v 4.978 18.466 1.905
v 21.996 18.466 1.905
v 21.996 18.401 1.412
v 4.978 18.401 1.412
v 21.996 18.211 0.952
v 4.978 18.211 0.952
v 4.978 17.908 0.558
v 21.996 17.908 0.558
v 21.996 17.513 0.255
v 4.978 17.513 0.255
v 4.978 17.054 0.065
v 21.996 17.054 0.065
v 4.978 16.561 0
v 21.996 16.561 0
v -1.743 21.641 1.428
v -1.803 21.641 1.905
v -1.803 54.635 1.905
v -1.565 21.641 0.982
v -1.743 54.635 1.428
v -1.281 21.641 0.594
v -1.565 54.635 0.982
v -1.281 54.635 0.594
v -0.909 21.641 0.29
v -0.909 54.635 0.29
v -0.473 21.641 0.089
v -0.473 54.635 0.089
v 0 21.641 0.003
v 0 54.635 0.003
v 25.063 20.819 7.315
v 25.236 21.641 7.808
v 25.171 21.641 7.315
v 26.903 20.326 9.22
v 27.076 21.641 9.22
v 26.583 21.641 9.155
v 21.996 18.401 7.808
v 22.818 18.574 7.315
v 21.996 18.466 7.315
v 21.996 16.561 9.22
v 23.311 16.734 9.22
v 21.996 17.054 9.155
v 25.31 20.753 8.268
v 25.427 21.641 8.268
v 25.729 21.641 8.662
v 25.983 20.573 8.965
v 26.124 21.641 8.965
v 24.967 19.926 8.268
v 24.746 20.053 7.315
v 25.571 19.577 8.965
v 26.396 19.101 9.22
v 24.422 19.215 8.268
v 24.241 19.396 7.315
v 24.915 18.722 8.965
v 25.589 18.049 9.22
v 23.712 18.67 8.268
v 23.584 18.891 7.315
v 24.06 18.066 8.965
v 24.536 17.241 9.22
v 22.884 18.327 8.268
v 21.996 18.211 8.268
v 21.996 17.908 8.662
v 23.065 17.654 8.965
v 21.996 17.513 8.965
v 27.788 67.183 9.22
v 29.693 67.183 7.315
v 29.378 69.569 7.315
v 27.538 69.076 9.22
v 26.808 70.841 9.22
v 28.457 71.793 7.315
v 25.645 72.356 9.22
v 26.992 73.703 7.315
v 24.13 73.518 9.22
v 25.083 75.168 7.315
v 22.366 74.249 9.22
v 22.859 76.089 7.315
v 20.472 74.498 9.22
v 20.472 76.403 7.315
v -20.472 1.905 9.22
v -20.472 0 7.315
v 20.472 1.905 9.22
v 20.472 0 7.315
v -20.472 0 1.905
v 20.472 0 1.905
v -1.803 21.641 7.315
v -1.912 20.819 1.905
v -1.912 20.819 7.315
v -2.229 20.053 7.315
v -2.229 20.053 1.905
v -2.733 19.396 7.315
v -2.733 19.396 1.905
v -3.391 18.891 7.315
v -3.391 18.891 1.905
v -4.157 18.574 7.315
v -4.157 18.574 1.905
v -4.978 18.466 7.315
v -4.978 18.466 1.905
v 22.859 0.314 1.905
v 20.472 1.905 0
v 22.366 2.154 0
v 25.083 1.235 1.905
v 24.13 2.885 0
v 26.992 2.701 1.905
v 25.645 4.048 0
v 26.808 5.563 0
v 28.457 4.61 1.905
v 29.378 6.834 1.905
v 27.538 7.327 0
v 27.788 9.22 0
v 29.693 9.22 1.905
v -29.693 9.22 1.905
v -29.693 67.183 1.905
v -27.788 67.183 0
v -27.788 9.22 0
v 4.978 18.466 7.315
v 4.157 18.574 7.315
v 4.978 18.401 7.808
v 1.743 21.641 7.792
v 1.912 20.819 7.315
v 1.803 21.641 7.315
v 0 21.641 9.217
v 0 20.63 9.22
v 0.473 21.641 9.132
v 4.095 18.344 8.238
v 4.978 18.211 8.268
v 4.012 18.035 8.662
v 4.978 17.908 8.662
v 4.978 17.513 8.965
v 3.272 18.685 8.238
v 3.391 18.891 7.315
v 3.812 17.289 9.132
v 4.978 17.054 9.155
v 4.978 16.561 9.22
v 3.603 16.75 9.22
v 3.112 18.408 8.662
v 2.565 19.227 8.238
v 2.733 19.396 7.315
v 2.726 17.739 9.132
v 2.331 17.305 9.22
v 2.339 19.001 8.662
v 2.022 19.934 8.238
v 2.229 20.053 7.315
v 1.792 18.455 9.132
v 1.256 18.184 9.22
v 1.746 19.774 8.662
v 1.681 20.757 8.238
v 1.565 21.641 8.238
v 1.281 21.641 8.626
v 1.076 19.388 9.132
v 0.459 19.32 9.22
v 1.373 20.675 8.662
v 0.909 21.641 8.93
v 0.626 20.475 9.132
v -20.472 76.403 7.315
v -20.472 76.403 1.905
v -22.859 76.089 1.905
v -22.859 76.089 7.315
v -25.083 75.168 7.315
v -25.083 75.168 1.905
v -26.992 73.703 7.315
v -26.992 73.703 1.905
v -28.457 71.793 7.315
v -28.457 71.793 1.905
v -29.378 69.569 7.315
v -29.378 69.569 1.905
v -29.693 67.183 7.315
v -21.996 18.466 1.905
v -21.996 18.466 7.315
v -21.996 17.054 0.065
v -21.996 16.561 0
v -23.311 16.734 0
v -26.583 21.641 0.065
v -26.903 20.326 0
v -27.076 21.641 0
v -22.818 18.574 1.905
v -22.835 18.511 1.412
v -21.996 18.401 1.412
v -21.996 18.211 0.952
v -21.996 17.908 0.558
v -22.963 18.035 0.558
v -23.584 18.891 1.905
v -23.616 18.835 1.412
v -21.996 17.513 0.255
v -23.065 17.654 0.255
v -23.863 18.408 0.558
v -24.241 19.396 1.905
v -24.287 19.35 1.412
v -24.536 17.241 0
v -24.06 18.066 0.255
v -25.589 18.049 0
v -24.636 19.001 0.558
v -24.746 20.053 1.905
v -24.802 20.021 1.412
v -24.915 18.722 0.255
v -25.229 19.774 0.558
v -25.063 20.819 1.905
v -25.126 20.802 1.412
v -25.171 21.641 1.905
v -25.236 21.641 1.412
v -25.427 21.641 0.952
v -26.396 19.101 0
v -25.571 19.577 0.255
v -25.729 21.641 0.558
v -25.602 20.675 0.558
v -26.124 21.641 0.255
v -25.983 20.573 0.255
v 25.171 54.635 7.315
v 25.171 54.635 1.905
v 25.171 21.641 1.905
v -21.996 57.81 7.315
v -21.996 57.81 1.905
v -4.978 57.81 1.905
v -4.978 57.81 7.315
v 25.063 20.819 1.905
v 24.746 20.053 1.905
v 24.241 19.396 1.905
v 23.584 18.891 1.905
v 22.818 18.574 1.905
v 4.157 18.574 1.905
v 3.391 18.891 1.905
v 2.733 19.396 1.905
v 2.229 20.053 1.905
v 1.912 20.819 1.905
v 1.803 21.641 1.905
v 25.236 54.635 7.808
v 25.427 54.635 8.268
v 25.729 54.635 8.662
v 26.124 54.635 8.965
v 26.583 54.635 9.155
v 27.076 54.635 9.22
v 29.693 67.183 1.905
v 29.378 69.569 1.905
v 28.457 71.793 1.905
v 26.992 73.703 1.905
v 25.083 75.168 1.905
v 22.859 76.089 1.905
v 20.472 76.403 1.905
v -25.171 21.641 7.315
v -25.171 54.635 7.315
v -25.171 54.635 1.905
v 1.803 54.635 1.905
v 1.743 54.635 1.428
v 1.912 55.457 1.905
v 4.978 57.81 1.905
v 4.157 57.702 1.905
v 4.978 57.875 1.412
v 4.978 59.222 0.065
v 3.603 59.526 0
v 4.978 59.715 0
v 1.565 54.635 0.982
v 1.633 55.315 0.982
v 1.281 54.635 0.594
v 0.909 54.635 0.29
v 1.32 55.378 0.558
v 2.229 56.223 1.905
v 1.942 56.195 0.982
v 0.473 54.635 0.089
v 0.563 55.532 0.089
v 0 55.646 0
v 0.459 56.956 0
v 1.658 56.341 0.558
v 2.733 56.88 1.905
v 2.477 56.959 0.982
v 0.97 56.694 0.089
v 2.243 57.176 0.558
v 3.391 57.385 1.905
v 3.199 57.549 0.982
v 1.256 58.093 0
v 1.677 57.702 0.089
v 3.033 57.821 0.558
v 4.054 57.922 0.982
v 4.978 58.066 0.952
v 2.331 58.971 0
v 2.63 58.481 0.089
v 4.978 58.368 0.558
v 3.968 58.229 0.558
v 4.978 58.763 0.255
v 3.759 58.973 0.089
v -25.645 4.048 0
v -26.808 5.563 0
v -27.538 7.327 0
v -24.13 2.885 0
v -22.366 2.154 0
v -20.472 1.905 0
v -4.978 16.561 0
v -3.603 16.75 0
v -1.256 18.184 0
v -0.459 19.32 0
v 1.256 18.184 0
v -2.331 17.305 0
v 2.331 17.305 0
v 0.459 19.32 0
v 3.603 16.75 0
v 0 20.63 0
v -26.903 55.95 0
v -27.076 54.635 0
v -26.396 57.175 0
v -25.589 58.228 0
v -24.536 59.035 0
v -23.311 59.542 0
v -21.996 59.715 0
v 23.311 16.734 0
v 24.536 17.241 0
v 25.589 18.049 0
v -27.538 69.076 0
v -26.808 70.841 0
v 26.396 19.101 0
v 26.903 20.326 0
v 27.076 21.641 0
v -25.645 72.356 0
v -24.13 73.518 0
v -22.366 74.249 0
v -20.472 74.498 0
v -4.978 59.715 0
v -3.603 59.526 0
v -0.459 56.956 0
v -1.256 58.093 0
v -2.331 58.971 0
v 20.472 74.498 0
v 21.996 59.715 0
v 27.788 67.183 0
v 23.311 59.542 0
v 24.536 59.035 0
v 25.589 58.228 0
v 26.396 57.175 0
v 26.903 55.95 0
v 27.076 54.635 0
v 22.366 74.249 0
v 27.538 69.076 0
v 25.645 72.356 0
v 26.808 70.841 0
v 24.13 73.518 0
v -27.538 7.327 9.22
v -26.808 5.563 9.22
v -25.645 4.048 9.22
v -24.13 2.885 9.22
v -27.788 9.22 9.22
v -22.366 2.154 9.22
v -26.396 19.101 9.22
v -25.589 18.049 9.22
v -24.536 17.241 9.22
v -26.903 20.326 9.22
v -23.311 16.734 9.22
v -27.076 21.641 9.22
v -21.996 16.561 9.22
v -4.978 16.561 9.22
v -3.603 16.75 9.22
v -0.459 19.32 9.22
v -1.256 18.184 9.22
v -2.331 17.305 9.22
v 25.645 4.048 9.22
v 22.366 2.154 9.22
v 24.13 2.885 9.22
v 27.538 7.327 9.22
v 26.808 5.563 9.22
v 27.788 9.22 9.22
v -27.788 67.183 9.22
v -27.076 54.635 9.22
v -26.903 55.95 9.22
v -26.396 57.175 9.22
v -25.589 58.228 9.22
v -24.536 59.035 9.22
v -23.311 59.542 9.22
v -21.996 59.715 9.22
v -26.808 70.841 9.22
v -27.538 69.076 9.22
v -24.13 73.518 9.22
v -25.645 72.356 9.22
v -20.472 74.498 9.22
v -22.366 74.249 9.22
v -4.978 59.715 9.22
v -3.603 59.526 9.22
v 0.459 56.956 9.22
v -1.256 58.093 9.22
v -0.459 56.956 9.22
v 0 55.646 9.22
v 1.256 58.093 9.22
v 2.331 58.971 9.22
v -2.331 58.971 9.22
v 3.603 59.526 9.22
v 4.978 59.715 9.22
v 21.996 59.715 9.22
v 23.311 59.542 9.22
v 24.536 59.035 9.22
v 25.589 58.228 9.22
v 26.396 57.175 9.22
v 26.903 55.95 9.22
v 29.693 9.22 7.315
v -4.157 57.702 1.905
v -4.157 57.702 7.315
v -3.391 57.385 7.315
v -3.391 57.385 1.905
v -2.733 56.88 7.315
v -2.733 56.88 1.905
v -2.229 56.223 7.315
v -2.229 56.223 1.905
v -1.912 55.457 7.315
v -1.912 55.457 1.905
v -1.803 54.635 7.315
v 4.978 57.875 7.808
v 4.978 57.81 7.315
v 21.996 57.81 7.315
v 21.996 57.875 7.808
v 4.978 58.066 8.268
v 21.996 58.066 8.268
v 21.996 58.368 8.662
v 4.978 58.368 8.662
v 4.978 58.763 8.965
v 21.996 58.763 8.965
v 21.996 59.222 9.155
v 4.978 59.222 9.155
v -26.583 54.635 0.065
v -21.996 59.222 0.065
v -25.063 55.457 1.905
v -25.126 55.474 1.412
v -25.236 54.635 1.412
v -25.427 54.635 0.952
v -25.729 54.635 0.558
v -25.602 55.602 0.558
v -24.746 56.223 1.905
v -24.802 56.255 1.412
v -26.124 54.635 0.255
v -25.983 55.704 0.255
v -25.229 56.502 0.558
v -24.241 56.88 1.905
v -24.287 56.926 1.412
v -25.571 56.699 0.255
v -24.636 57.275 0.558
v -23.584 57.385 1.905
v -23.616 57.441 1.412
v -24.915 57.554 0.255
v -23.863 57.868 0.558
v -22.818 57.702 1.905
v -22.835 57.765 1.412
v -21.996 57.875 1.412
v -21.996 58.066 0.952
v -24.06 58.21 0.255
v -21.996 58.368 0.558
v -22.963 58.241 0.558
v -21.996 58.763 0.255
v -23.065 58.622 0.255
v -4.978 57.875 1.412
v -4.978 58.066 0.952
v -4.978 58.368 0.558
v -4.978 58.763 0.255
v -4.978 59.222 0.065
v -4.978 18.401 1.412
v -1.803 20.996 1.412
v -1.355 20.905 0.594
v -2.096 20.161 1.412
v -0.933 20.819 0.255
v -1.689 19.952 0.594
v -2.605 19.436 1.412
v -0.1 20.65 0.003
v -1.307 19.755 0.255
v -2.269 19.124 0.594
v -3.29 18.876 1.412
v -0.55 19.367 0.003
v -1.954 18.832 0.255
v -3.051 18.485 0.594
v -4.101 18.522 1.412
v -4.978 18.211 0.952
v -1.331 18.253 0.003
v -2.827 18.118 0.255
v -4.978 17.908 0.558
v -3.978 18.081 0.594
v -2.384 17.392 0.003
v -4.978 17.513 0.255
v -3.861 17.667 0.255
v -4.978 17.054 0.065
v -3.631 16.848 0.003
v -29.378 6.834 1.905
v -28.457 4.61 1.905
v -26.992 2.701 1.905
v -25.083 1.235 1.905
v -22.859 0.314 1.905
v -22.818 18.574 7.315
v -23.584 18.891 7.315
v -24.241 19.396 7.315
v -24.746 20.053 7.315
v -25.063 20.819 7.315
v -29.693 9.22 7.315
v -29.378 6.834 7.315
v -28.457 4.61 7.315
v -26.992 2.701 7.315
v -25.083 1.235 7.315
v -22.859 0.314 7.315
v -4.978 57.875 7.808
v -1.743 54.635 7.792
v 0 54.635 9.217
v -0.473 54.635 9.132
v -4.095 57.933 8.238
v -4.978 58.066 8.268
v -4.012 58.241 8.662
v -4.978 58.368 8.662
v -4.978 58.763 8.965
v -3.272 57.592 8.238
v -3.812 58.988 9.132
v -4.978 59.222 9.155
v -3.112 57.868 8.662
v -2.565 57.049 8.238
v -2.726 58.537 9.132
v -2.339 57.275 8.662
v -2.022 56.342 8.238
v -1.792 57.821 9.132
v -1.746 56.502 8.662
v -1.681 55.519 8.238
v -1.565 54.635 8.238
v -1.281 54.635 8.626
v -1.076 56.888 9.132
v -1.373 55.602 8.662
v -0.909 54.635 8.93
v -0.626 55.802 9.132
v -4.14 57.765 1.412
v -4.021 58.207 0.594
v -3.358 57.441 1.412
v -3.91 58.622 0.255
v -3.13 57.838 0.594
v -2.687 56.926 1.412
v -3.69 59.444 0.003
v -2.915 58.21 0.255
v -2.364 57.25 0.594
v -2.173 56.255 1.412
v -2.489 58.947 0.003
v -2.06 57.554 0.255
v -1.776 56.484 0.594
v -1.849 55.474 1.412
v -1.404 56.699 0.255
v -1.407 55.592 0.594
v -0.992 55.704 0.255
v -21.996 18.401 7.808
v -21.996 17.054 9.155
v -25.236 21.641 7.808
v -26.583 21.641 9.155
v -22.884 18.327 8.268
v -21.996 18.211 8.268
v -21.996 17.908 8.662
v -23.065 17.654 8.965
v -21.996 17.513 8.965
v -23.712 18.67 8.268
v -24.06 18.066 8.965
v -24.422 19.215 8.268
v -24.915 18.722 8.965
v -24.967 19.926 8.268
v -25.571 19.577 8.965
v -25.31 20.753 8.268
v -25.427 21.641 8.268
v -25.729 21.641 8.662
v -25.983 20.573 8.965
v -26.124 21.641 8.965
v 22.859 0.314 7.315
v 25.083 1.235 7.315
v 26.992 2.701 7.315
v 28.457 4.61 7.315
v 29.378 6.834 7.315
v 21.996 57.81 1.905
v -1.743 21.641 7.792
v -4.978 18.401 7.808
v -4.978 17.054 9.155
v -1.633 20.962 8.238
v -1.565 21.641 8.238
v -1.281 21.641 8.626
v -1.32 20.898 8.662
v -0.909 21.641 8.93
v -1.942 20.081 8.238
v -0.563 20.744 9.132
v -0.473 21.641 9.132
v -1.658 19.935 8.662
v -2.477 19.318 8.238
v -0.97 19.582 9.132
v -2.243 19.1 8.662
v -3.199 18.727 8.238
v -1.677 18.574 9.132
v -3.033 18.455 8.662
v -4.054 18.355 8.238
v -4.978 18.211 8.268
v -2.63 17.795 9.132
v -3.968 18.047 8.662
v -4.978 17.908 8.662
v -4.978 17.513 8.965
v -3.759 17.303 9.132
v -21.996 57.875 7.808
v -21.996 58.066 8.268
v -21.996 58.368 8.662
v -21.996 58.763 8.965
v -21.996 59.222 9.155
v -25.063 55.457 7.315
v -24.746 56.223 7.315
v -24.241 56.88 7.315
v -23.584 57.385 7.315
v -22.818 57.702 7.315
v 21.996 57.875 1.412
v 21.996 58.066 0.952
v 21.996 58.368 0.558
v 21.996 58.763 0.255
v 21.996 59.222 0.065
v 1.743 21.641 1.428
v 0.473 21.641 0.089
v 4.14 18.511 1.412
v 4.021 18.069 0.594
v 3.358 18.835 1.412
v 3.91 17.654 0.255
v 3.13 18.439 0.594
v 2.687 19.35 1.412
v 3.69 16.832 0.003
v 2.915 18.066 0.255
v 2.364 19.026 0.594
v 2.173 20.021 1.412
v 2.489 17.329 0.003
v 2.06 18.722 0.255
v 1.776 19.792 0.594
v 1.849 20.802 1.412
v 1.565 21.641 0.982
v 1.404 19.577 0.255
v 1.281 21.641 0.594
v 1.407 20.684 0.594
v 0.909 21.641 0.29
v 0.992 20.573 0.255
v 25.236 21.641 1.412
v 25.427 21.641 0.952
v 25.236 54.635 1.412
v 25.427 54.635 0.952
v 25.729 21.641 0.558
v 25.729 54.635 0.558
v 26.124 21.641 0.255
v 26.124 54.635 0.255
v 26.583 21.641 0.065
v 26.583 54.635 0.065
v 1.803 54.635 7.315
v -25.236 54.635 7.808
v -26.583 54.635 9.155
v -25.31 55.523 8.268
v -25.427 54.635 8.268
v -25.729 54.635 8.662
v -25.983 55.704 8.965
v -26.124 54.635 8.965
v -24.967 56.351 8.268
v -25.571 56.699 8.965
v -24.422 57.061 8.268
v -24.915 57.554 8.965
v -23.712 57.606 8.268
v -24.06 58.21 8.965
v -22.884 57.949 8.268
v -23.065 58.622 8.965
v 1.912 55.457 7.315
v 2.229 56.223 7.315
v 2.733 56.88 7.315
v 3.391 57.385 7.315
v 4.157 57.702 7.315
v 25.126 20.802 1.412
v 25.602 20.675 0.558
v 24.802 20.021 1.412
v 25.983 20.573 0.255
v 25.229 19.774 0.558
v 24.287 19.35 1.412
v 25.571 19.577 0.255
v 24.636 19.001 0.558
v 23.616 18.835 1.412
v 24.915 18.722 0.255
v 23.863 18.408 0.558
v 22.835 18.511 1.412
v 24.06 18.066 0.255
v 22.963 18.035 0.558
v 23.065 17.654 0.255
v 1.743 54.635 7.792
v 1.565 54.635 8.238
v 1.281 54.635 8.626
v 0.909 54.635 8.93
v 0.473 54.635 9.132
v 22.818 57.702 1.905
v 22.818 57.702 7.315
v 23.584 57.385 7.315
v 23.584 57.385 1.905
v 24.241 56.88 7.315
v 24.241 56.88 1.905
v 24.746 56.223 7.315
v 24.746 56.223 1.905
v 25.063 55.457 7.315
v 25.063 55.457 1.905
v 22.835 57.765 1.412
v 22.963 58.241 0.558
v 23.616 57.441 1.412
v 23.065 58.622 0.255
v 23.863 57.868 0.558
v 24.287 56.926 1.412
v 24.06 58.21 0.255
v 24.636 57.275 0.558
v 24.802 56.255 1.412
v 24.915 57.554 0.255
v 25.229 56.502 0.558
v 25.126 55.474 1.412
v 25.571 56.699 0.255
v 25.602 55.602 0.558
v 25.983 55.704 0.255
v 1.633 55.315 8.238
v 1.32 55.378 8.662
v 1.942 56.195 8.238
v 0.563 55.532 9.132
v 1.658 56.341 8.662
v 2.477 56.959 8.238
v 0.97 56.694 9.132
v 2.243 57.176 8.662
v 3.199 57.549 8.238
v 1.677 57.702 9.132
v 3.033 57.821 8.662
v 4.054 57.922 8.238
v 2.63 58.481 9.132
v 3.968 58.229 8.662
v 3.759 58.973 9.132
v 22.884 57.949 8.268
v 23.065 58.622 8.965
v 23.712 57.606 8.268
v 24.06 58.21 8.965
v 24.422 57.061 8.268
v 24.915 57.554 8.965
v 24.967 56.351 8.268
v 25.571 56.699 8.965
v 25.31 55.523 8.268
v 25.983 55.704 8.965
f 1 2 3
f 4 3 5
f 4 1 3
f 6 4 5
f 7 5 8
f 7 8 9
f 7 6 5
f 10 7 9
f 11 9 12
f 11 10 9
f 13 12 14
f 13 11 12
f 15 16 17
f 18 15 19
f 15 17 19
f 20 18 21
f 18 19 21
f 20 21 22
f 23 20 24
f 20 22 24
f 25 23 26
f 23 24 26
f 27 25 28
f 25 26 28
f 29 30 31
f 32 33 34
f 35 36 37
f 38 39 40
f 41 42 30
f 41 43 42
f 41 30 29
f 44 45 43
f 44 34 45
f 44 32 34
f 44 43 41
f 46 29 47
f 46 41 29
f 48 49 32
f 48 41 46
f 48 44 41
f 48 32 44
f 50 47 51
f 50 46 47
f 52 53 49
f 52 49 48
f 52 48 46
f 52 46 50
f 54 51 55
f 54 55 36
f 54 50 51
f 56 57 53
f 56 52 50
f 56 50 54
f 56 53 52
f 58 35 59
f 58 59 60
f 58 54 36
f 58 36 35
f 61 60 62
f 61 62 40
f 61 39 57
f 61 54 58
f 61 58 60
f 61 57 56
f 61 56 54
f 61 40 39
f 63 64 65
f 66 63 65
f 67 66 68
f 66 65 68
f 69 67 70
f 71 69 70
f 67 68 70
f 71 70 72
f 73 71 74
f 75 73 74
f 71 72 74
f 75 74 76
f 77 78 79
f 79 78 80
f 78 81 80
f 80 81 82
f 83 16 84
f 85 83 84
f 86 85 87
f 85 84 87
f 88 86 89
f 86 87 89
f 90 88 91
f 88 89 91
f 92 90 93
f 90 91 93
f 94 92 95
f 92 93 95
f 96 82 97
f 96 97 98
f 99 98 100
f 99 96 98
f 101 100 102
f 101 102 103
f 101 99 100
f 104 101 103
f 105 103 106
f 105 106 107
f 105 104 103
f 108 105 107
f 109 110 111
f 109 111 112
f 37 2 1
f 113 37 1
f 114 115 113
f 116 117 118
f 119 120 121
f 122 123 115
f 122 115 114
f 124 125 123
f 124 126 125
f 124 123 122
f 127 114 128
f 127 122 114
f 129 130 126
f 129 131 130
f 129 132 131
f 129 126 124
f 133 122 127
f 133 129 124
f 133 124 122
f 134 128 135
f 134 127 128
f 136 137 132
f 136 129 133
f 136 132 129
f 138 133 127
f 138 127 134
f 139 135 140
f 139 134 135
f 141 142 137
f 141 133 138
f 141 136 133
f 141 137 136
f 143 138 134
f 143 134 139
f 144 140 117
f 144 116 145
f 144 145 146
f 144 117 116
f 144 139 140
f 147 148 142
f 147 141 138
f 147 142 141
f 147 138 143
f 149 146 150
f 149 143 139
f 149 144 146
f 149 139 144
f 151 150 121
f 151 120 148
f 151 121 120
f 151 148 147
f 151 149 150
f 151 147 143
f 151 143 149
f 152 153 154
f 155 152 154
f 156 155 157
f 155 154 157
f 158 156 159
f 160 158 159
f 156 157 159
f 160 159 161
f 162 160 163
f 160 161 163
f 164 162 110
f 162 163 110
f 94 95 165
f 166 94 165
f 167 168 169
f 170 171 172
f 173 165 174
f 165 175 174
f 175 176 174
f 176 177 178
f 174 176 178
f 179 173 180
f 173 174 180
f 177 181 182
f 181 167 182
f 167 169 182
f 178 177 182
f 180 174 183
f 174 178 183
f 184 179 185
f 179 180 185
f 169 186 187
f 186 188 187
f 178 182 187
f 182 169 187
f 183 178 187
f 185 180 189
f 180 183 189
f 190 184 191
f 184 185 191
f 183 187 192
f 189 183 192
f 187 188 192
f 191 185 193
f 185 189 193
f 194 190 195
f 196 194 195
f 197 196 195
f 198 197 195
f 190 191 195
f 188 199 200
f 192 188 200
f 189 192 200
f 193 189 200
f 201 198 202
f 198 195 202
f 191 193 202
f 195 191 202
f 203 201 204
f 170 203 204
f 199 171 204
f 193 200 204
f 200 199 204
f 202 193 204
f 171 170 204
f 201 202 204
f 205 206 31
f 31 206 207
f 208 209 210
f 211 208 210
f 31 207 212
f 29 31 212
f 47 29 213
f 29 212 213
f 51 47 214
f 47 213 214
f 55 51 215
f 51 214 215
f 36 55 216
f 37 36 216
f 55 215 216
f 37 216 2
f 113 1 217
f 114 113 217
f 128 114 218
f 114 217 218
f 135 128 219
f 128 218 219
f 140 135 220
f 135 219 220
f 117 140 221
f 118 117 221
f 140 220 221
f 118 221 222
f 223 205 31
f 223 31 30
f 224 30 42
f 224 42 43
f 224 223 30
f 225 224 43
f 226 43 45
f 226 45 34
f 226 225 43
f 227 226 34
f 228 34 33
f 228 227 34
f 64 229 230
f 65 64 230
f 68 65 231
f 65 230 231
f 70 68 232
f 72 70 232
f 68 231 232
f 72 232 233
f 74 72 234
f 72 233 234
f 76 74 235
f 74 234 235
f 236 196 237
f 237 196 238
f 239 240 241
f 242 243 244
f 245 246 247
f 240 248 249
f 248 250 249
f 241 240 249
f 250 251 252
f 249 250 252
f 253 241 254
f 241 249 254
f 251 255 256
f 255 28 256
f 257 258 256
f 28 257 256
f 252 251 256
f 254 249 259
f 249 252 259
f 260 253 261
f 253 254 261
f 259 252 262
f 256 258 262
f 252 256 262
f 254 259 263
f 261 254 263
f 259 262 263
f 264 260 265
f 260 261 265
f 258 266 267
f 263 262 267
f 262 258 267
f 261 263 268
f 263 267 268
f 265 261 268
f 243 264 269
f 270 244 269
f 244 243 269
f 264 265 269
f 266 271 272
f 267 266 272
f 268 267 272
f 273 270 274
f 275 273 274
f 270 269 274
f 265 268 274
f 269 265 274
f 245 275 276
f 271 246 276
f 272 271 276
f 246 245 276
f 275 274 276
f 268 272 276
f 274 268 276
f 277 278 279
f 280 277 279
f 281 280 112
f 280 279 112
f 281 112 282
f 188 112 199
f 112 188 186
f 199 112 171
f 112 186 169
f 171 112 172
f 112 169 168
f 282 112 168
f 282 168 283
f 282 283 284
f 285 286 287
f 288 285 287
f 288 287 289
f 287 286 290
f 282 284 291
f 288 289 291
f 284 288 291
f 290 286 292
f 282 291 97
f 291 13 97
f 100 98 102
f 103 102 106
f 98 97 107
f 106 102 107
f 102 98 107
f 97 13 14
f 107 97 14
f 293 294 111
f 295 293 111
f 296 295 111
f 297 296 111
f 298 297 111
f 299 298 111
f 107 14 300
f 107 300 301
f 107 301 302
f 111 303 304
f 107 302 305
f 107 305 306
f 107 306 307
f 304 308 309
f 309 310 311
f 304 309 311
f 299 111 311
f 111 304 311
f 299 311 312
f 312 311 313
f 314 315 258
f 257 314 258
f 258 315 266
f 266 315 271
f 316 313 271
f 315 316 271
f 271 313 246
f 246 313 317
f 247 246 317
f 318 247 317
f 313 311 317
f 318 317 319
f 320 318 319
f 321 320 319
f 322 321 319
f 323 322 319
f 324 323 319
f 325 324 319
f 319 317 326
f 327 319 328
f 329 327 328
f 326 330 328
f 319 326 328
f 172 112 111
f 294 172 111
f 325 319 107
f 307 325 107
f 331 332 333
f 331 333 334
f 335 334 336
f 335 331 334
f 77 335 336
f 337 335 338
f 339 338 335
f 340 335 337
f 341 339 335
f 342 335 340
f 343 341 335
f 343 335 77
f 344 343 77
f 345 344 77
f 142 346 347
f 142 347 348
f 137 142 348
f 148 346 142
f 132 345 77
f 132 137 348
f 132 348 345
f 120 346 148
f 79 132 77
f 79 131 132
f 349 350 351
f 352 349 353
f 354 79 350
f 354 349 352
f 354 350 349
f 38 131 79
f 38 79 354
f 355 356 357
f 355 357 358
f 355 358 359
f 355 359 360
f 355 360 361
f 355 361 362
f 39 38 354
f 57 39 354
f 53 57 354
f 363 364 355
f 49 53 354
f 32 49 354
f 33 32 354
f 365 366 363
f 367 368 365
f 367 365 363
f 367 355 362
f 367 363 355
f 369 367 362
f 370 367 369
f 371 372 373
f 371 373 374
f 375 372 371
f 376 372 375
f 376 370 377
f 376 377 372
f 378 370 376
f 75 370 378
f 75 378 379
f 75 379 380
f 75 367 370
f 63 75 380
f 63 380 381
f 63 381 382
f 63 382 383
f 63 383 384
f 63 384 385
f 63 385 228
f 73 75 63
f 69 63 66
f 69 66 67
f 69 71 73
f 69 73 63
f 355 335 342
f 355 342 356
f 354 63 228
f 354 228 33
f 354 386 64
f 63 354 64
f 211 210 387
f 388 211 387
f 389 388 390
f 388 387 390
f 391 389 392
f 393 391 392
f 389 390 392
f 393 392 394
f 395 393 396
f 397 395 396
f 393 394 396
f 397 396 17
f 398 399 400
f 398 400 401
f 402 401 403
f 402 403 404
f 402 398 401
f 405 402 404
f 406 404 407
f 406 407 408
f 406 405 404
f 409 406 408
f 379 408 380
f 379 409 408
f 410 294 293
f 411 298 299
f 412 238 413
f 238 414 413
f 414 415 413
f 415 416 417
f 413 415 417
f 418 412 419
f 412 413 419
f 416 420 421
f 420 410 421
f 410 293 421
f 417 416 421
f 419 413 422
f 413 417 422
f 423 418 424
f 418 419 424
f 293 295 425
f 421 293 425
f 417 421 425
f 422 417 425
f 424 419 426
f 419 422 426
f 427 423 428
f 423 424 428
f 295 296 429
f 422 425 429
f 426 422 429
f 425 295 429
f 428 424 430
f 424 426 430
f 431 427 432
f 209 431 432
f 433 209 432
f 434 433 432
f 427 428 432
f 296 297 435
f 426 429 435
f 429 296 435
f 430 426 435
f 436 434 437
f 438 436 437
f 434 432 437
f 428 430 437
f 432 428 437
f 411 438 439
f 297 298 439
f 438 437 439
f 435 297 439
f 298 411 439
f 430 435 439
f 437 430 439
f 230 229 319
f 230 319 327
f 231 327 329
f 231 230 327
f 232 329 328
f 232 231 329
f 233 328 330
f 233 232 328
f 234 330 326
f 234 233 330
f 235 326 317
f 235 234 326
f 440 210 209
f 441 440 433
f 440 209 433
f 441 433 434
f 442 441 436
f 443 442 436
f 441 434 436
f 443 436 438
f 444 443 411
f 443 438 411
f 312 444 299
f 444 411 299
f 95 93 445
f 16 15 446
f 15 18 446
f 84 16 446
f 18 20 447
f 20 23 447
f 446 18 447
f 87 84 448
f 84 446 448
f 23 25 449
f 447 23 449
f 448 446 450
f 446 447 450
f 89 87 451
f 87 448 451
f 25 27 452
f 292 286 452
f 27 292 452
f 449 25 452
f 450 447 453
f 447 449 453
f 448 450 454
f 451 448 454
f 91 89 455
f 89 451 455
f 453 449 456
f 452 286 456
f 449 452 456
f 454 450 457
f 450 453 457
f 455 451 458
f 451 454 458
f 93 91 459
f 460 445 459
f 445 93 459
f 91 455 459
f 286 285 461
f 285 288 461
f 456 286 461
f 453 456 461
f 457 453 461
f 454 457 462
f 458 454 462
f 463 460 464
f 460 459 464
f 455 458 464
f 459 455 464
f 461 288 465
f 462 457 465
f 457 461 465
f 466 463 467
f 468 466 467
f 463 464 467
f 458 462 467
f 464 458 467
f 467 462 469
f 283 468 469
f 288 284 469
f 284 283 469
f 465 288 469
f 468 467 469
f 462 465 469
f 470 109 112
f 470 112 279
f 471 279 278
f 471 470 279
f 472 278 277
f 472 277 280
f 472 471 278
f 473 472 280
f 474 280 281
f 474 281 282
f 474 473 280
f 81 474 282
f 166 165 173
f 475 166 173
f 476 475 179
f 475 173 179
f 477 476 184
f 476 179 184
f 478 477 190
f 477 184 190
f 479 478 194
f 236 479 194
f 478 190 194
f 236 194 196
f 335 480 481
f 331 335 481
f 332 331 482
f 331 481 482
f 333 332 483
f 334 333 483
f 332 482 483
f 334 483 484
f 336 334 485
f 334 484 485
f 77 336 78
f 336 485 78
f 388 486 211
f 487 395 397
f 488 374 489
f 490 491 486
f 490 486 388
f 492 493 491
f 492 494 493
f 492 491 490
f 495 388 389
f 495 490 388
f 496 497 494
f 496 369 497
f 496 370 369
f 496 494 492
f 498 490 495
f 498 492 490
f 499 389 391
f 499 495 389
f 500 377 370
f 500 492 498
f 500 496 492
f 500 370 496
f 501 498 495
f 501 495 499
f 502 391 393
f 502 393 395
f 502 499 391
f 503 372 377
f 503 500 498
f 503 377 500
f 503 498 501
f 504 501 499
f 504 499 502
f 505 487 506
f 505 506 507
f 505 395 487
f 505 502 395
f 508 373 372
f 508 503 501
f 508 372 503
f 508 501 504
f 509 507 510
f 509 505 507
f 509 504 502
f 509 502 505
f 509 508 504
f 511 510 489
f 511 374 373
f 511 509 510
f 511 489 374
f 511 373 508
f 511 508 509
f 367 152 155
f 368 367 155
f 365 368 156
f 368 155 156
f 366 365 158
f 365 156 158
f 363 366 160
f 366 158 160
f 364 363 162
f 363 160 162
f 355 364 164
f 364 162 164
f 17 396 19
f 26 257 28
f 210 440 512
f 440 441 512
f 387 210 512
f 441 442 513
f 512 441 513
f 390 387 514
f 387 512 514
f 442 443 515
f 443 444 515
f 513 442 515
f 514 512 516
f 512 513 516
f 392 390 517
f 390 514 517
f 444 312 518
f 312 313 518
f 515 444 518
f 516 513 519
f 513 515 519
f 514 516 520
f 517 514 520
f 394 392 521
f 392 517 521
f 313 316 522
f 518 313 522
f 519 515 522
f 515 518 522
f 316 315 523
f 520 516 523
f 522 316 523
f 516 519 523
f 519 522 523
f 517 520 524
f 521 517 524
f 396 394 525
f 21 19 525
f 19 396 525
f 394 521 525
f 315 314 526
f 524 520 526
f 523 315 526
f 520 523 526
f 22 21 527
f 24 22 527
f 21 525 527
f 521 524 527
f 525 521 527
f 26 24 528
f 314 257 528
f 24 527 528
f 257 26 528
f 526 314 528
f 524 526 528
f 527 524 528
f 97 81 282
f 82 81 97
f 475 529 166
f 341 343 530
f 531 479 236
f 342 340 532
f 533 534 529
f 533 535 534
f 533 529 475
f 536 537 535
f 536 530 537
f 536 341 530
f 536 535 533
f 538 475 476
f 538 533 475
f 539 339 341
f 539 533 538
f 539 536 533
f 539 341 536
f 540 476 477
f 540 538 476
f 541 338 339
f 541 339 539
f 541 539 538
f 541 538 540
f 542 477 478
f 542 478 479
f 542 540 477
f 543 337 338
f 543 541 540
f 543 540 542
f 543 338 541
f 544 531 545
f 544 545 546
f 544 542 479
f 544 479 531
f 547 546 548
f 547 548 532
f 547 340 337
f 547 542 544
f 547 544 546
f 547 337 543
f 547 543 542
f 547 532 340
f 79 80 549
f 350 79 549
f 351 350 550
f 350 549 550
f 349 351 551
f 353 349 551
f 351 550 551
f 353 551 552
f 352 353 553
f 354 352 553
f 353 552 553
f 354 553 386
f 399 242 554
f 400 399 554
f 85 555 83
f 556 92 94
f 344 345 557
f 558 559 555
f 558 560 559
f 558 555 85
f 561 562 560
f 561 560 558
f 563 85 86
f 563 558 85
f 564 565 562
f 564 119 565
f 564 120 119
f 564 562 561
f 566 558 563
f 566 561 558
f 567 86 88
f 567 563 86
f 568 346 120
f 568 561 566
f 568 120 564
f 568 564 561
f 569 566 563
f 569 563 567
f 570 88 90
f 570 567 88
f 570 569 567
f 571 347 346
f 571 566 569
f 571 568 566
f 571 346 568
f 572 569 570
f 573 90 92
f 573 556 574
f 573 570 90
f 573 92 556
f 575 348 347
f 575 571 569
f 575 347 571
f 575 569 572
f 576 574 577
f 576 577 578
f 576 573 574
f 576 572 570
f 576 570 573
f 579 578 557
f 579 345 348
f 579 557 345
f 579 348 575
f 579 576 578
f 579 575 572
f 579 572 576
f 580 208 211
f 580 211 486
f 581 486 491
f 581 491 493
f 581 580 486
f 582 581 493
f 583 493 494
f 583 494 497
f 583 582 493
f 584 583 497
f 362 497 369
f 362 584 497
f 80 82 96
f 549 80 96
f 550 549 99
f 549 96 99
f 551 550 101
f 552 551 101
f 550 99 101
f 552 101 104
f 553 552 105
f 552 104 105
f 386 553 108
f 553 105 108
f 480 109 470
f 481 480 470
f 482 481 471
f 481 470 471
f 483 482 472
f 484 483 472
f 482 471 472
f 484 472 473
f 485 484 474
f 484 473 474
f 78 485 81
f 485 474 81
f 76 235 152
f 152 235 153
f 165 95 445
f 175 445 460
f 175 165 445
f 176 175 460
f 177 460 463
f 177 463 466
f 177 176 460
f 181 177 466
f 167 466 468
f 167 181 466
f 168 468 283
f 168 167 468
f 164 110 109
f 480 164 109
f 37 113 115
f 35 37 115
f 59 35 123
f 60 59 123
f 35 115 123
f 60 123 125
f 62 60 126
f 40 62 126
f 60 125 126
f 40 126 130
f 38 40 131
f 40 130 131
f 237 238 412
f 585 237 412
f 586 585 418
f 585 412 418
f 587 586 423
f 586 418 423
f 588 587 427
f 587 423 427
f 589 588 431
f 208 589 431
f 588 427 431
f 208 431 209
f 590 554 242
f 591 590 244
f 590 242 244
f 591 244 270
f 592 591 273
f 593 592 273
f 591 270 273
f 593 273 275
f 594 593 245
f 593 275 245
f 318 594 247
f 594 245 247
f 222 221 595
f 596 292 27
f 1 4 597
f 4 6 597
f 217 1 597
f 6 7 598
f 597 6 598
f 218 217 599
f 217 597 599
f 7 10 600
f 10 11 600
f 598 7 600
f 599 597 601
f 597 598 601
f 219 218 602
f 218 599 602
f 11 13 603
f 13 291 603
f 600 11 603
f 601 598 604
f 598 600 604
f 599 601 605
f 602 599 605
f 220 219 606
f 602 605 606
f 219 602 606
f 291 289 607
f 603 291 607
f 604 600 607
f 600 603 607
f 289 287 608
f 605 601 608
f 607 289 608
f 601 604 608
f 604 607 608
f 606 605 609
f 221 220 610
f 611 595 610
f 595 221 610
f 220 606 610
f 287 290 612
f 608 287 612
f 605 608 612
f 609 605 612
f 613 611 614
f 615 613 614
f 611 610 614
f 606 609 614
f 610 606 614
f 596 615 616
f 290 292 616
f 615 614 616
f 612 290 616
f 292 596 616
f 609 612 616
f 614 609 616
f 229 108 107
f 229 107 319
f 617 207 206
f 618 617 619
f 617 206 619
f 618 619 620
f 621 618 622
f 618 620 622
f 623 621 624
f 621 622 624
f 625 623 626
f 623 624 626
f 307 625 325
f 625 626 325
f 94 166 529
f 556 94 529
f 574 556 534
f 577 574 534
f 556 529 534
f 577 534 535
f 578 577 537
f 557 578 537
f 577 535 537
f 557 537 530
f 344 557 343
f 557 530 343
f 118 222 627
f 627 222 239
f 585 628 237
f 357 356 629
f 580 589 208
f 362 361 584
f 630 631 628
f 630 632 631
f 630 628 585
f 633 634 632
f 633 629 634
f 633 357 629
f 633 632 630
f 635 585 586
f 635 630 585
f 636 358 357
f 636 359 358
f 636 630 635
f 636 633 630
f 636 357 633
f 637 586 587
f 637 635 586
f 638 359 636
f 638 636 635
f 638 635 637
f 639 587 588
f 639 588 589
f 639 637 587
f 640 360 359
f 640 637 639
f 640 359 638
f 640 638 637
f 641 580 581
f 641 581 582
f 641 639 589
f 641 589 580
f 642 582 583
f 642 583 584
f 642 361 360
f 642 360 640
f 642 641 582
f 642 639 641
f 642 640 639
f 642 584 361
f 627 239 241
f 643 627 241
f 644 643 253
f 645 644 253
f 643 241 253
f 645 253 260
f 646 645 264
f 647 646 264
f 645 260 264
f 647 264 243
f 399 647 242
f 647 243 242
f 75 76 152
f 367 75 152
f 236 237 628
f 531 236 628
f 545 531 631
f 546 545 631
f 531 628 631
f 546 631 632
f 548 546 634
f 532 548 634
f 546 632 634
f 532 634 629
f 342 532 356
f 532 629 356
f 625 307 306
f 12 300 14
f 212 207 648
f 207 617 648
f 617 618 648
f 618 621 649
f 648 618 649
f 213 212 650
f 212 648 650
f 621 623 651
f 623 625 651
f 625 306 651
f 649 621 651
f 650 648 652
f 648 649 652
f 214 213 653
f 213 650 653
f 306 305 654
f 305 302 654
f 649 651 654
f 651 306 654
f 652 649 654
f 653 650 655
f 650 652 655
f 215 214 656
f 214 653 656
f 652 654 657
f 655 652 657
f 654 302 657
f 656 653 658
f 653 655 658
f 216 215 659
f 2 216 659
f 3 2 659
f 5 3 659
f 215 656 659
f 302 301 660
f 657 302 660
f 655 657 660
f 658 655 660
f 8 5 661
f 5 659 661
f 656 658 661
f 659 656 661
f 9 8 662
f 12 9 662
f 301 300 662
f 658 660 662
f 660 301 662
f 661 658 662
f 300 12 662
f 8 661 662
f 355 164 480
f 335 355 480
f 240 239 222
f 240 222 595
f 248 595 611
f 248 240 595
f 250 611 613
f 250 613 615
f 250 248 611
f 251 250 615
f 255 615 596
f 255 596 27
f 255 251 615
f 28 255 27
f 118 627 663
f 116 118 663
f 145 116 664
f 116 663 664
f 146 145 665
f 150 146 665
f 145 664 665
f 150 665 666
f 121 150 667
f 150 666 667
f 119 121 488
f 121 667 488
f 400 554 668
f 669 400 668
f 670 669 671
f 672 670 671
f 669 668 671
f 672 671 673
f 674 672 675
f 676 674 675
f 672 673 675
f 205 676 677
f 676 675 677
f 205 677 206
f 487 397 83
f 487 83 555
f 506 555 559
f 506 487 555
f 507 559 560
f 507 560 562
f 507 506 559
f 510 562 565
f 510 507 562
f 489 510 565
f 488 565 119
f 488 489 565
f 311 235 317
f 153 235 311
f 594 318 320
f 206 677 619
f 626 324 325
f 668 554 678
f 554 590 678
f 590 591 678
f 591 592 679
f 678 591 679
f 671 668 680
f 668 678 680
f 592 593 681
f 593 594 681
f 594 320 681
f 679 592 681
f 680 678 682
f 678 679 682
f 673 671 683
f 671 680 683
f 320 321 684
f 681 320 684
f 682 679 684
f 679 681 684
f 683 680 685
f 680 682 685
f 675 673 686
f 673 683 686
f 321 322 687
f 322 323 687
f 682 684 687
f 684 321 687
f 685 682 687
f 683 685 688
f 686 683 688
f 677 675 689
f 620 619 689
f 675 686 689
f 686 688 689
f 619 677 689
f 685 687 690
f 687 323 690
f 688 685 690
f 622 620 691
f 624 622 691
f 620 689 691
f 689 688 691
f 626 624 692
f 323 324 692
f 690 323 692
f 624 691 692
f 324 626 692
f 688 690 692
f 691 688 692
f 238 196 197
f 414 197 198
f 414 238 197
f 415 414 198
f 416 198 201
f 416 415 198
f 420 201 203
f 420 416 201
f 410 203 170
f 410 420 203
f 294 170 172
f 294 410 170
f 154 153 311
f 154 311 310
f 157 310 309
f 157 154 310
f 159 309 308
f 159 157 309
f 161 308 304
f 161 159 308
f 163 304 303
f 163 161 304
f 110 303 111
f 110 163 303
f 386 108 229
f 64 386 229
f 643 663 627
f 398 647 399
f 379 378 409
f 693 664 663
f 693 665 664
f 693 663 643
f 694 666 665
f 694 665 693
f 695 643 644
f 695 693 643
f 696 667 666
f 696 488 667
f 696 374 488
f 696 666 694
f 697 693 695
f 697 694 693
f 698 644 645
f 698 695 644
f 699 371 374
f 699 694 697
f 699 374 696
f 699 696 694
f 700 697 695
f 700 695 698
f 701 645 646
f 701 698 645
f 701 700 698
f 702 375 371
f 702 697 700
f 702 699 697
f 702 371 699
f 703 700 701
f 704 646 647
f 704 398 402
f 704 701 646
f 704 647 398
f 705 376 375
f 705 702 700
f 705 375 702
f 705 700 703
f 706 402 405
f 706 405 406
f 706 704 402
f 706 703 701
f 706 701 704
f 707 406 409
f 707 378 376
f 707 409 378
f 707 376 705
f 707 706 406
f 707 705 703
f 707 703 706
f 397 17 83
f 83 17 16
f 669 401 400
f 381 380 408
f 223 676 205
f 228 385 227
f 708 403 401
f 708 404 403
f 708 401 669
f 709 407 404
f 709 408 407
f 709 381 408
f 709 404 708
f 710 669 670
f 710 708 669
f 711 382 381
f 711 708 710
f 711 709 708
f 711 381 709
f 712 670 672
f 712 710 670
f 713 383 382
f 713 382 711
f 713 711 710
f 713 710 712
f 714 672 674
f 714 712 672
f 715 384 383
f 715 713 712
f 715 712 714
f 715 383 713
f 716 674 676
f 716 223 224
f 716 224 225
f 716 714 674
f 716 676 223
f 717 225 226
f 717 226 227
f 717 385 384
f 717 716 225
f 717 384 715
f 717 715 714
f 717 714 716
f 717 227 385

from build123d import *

# Parameters (mm, degrees)
F1_DEPTH     = 9.2202
F2_T1_DEPTH  = 32.9946
F2_T3_DEPTH  = 17.018
F2_T5_DEPTH  = 17.018
F2_T8_ANGLE  = 90
F2_T10_ANGLE = 90
F2_T12_ANGLE = 90
F2_T14_ANGLE = 90
F2_T16_ANGLE = 90
F2_T18_ANGLE = 90
F2_T20_ANGLE = 90
F2_T22_ANGLE = 90
F2_T24_ANGLE = 90
F2_T26_ANGLE = 90
F2_T28_ANGLE = 90
F2_T30_ANGLE = 90
F2_T32_ANGLE = 90
F2_T34_ANGLE = 90
F2_T36_ANGLE = 90
F2_T38_ANGLE = 90
F3_SIZE      = 1.905


# Not quite as in the source:
# - a fillet or chamfer that OpenCascade refuses, or shapes differently, is made with other operations: its cross-section is extruded or revolved along the edge and cut away or added


with BuildPart() as f1:
    # F0 (on Top) → F1 (new body)
    with BuildSketch(Plane.XY):
        with BuildLine():
            Line((20.4724, 76.4032), (-20.4724, 76.4032))
            ThreePointArc((-20.4724, 76.4032), (-26.9920659439, 73.7026659439), (-29.6926, 67.183))
            Line((-29.6926, 67.183), (-29.6926, 9.2202))
            ThreePointArc((-29.6926, 9.2202), (-26.9920659439, 2.7005340561), (-20.4724, 0))
            Line((-20.4724, 0), (20.4724, 0))
            ThreePointArc((20.4724, 0), (26.9920659439, 2.7005340561), (29.6926, 9.2202))
            Line((29.6926, 9.2202), (29.6926, 67.183))
            ThreePointArc((29.6926, 67.183), (26.9920659439, 73.7026659439), (20.4724, 76.4032))
        make_face()
        with BuildLine():
            Line((-25.1714, 21.6408), (-25.1714, 54.6354))
            ThreePointArc((-25.1714, 54.6354), (-24.2414640303, 56.8804640303), (-21.9964, 57.8104))
            Line((-21.9964, 57.8104), (-4.9784, 57.8104))
            ThreePointArc((-4.9784, 57.8104), (-2.7333359697, 56.8804640303), (-1.8034, 54.6354))
            Line((-1.8034, 54.6354), (-1.8034, 21.6408))
            ThreePointArc((-1.8034, 21.6408), (-2.7333359697, 19.3957359697), (-4.9784, 18.4658))
            Line((-4.9784, 18.4658), (-21.9964, 18.4658))
            ThreePointArc((-21.9964, 18.4658), (-24.2414640303, 19.3957359697), (-25.1714, 21.6408))
        make_face(mode=Mode.SUBTRACT)
        with BuildLine():
            Line((1.8034, 21.6408), (1.8034, 54.6354))
            ThreePointArc((1.8034, 54.6354), (2.7333359697, 56.8804640303), (4.9784, 57.8104))
            Line((4.9784, 57.8104), (21.9964, 57.8104))
            ThreePointArc((21.9964, 57.8104), (24.2414640303, 56.8804640303), (25.1714, 54.6354))
            Line((25.1714, 54.6354), (25.1714, 21.6408))
            ThreePointArc((25.1714, 21.6408), (24.2414640303, 19.3957359697), (21.9964, 18.4658))
            Line((21.9964, 18.4658), (4.9784, 18.4658))
            ThreePointArc((4.9784, 18.4658), (2.7333359697, 19.3957359697), (1.8034, 21.6408))
        make_face(mode=Mode.SUBTRACT)
    extrude(amount=F1_DEPTH)

    # F2: fillet of radius 1.905 on 4 edges, made by hand

    # F2_s2 → F2_t1 (cut)
    with BuildSketch(Plane.XZ.offset(-54.6354)):
        with BuildLine():
            ThreePointArc((25.1714, 1.905), (25.7293615818, 0.5579615818), (27.0764, 0))
            Line((27.0764, 0), (25.1714, 0))
            Line((25.1714, 0), (25.1714, 1.905))
        make_face()
        with BuildLine():
            ThreePointArc((-25.1714, 1.905), (-25.7293615818, 0.5579615818), (-27.0764, 0))
            Line((-27.0764, 0), (-25.1714, 0))
            Line((-25.1714, 0), (-25.1714, 1.905))
        make_face()
        with BuildLine():
            ThreePointArc((-1.8034, 7.3152), (-1.2454384182, 8.6622384182), (0.1016, 9.2202))
            Line((0.1016, 9.2202), (-1.8034, 9.2202))
            Line((-1.8034, 9.2202), (-1.8034, 7.3152))
        make_face()
        with BuildLine():
            ThreePointArc((25.1714, 7.3152), (25.7293615818, 8.6622384182), (27.0764, 9.2202))
            Line((27.0764, 9.2202), (25.1714, 9.2202))
            Line((25.1714, 9.2202), (25.1714, 7.3152))
        make_face()
        with BuildLine():
            ThreePointArc((1.8034, 7.3152), (1.2454384182, 8.6622384182), (-0.1016, 9.2202))
            Line((-0.1016, 9.2202), (1.8034, 9.2202))
            Line((1.8034, 9.2202), (1.8034, 7.3152))
        make_face()
        with BuildLine():
            ThreePointArc((-25.1714, 7.3152), (-25.7293615818, 8.6622384182), (-27.0764, 9.2202))
            Line((-27.0764, 9.2202), (-25.1714, 9.2202))
            Line((-25.1714, 9.2202), (-25.1714, 7.3152))
        make_face()
        with BuildLine():
            ThreePointArc((-1.8034, 1.905), (-1.2454384182, 0.5579615818), (0.1016, 0))
            Line((0.1016, 0), (-1.8034, 0))
            Line((-1.8034, 0), (-1.8034, 1.905))
        make_face()
        with BuildLine():
            ThreePointArc((1.8034, 1.905), (1.2454384182, 0.5579615818), (-0.1016, 0))
            Line((-0.1016, 0), (1.8034, 0))
            Line((1.8034, 0), (1.8034, 1.905))
        make_face()
    extrude(amount=F2_T1_DEPTH, mode=Mode.SUBTRACT)

    # F2_s4 → F2_t3 (cut)
    with BuildSketch(Plane.YZ.offset(4.9784)):
        with BuildLine():
            ThreePointArc((57.8104, 7.3152), (58.3683615818, 8.6622384182), (59.7154, 9.2202))
            Line((59.7154, 9.2202), (57.8104, 9.2202))
            Line((57.8104, 9.2202), (57.8104, 7.3152))
        make_face()
        with BuildLine():
            ThreePointArc((18.4658, 7.3152), (17.9078384182, 8.6622384182), (16.5608, 9.2202))
            Line((16.5608, 9.2202), (18.4658, 9.2202))
            Line((18.4658, 9.2202), (18.4658, 7.3152))
        make_face()
        with BuildLine():
            ThreePointArc((18.4658, 1.905), (17.9078384182, 0.5579615818), (16.5608, 0))
            Line((16.5608, 0), (18.4658, 0))
            Line((18.4658, 0), (18.4658, 1.905))
        make_face()
        with BuildLine():
            ThreePointArc((57.8104, 1.905), (58.3683615818, 0.5579615818), (59.7154, 0))
            Line((59.7154, 0), (57.8104, 0))
            Line((57.8104, 0), (57.8104, 1.905))
        make_face()
    extrude(amount=F2_T3_DEPTH, mode=Mode.SUBTRACT)

    # F2_s6 → F2_t5 (cut)
    with BuildSketch(Plane.YZ.offset(-21.9964)):
        with BuildLine():
            ThreePointArc((18.4658, 7.3152), (17.9078384182, 8.6622384182), (16.5608, 9.2202))
            Line((16.5608, 9.2202), (18.4658, 9.2202))
            Line((18.4658, 9.2202), (18.4658, 7.3152))
        make_face()
        with BuildLine():
            ThreePointArc((57.8104, 7.3152), (58.3683615818, 8.6622384182), (59.7154, 9.2202))
            Line((59.7154, 9.2202), (57.8104, 9.2202))
            Line((57.8104, 9.2202), (57.8104, 7.3152))
        make_face()
        with BuildLine():
            ThreePointArc((57.8104, 1.905), (58.3683615818, 0.5579615818), (59.7154, 0))
            Line((59.7154, 0), (57.8104, 0))
            Line((57.8104, 0), (57.8104, 1.905))
        make_face()
        with BuildLine():
            ThreePointArc((18.4658, 1.905), (17.9078384182, 0.5579615818), (16.5608, 0))
            Line((16.5608, 0), (18.4658, 0))
            Line((18.4658, 0), (18.4658, 1.905))
        make_face()
    extrude(amount=F2_T5_DEPTH, mode=Mode.SUBTRACT)

    # F2_s7 → F2_t8 (revolve, cut)
    with BuildSketch(Plane.XZ.offset(-54.6354)):
        with BuildLine():
            ThreePointArc((1.8034, 7.3152), (1.2454384182, 8.6622384182), (-0.1016, 9.2202))
            Line((-0.1016, 9.2202), (1.8034, 9.2202))
            Line((1.8034, 9.2202), (1.8034, 7.3152))
        make_face()
    revolve(axis=Axis((4.9784, 54.6354, 9.2202), (0, 0, -1)), revolution_arc=F2_T8_ANGLE, mode=Mode.SUBTRACT)

    # F2_s9 → F2_t10 (revolve, cut)
    with BuildSketch(Plane.YZ.offset(21.9964)):
        with BuildLine():
            ThreePointArc((57.8104, 7.3152), (58.3683615818, 8.6622384182), (59.7154, 9.2202))
            Line((59.7154, 9.2202), (57.8104, 9.2202))
            Line((57.8104, 9.2202), (57.8104, 7.3152))
        make_face()
    revolve(axis=Axis((21.9964, 54.6354, 9.2202), (0, 0, -1)), revolution_arc=F2_T10_ANGLE, mode=Mode.SUBTRACT)

    # F2_s11 → F2_t12 (revolve, cut)
    with BuildSketch(Plane.XZ.offset(-21.6408)):
        with BuildLine():
            ThreePointArc((25.1714, 7.3152), (25.7293615818, 8.6622384182), (27.0764, 9.2202))
            Line((27.0764, 9.2202), (25.1714, 9.2202))
            Line((25.1714, 9.2202), (25.1714, 7.3152))
        make_face()
    revolve(axis=Axis((21.9964, 21.6408, 9.2202), (0, 0, -1)), revolution_arc=F2_T12_ANGLE, mode=Mode.SUBTRACT)

    # F2_s13 → F2_t14 (revolve, cut)
    with BuildSketch(Plane.YZ.offset(4.9784)):
        with BuildLine():
            ThreePointArc((18.4658, 7.3152), (17.9078384182, 8.6622384182), (16.5608, 9.2202))
            Line((16.5608, 9.2202), (18.4658, 9.2202))
            Line((18.4658, 9.2202), (18.4658, 7.3152))
        make_face()
    revolve(axis=Axis((4.9784, 21.6408, 9.2202), (0, 0, -1)), revolution_arc=F2_T14_ANGLE, mode=Mode.SUBTRACT)

    # F2_s15 → F2_t16 (revolve, cut)
    with BuildSketch(Plane.YZ.offset(-4.9784)):
        with BuildLine():
            ThreePointArc((57.8104, 7.3152), (58.3683615818, 8.6622384182), (59.7154, 9.2202))
            Line((59.7154, 9.2202), (57.8104, 9.2202))
            Line((57.8104, 9.2202), (57.8104, 7.3152))
        make_face()
    revolve(axis=Axis((-4.9784, 54.6354, 9.2202), (0, 0, -1)), revolution_arc=F2_T16_ANGLE, mode=Mode.SUBTRACT)

    # F2_s17 → F2_t18 (revolve, cut)
    with BuildSketch(Plane.XZ.offset(-21.6408)):
        with BuildLine():
            ThreePointArc((-1.8034, 7.3152), (-1.2454384182, 8.6622384182), (0.1016, 9.2202))
            Line((0.1016, 9.2202), (-1.8034, 9.2202))
            Line((-1.8034, 9.2202), (-1.8034, 7.3152))
        make_face()
    revolve(axis=Axis((-4.9784, 21.6408, 9.2202), (0, 0, -1)), revolution_arc=F2_T18_ANGLE, mode=Mode.SUBTRACT)

    # F2_s19 → F2_t20 (revolve, cut)
    with BuildSketch(Plane.YZ.offset(-21.9964)):
        with BuildLine():
            ThreePointArc((18.4658, 7.3152), (17.9078384182, 8.6622384182), (16.5608, 9.2202))
            Line((16.5608, 9.2202), (18.4658, 9.2202))
            Line((18.4658, 9.2202), (18.4658, 7.3152))
        make_face()
    revolve(axis=Axis((-21.9964, 21.6408, 9.2202), (0, 0, -1)), revolution_arc=F2_T20_ANGLE, mode=Mode.SUBTRACT)

    # F2_s21 → F2_t22 (revolve, cut)
    with BuildSketch(Plane.XZ.offset(-54.6354)):
        with BuildLine():
            ThreePointArc((-25.1714, 7.3152), (-25.7293615818, 8.6622384182), (-27.0764, 9.2202))
            Line((-27.0764, 9.2202), (-25.1714, 9.2202))
            Line((-25.1714, 9.2202), (-25.1714, 7.3152))
        make_face()
    revolve(axis=Axis((-21.9964, 54.6354, 9.2202), (0, 0, -1)), revolution_arc=F2_T22_ANGLE, mode=Mode.SUBTRACT)

    # F2_s23 → F2_t24 (revolve, cut)
    with BuildSketch(Plane.YZ.offset(-21.9964)):
        with BuildLine():
            ThreePointArc((18.4658, 1.905), (17.9078384182, 0.5579615818), (16.5608, 0))
            Line((16.5608, 0), (18.4658, 0))
            Line((18.4658, 0), (18.4658, 1.905))
        make_face()
    revolve(axis=Axis((-21.9964, 21.6408, 0), (0, 0, -1)), revolution_arc=F2_T24_ANGLE, mode=Mode.SUBTRACT)

    # F2_s25 → F2_t26 (revolve, cut)
    with BuildSketch(Plane.XZ.offset(-54.6354)):
        with BuildLine():
            ThreePointArc((-25.1714, 1.905), (-25.7293615818, 0.5579615818), (-27.0764, 0))
            Line((-27.0764, 0), (-25.1714, 0))
            Line((-25.1714, 0), (-25.1714, 1.905))
        make_face()
    revolve(axis=Axis((-21.9964, 54.6354, 0), (0, 0, -1)), revolution_arc=F2_T26_ANGLE, mode=Mode.SUBTRACT)

    # F2_s27 → F2_t28 (revolve, cut)
    with BuildSketch(Plane.YZ.offset(-4.9784)):
        with BuildLine():
            ThreePointArc((57.8104, 1.905), (58.3683615818, 0.5579615818), (59.7154, 0))
            Line((59.7154, 0), (57.8104, 0))
            Line((57.8104, 0), (57.8104, 1.905))
        make_face()
    revolve(axis=Axis((-4.9784, 54.6354, 0), (0, 0, -1)), revolution_arc=F2_T28_ANGLE, mode=Mode.SUBTRACT)

    # F2_s29 → F2_t30 (revolve, cut)
    with BuildSketch(Plane.XZ.offset(-21.6408)):
        with BuildLine():
            ThreePointArc((-1.8034, 1.905), (-1.2454384182, 0.5579615818), (0.1016, 0))
            Line((0.1016, 0), (-1.8034, 0))
            Line((-1.8034, 0), (-1.8034, 1.905))
        make_face()
    revolve(axis=Axis((-4.9784, 21.6408, 0), (0, 0, -1)), revolution_arc=F2_T30_ANGLE, mode=Mode.SUBTRACT)

    # F2_s31 → F2_t32 (revolve, cut)
    with BuildSketch(Plane.YZ.offset(21.9964)):
        with BuildLine():
            ThreePointArc((57.8104, 1.905), (58.3683615818, 0.5579615818), (59.7154, 0))
            Line((59.7154, 0), (57.8104, 0))
            Line((57.8104, 0), (57.8104, 1.905))
        make_face()
    revolve(axis=Axis((21.9964, 54.6354, 0), (0, 0, -1)), revolution_arc=F2_T32_ANGLE, mode=Mode.SUBTRACT)

    # F2_s33 → F2_t34 (revolve, cut)
    with BuildSketch(Plane.XZ.offset(-21.6408)):
        with BuildLine():
            ThreePointArc((25.1714, 1.905), (25.7293615818, 0.5579615818), (27.0764, 0))
            Line((27.0764, 0), (25.1714, 0))
            Line((25.1714, 0), (25.1714, 1.905))
        make_face()
    revolve(axis=Axis((21.9964, 21.6408, 0), (0, 0, -1)), revolution_arc=F2_T34_ANGLE, mode=Mode.SUBTRACT)

    # F2_s35 → F2_t36 (revolve, cut)
    with BuildSketch(Plane.YZ.offset(4.9784)):
        with BuildLine():
            ThreePointArc((18.4658, 1.905), (17.9078384182, 0.5579615818), (16.5608, 0))
            Line((16.5608, 0), (18.4658, 0))
            Line((18.4658, 0), (18.4658, 1.905))
        make_face()
    revolve(axis=Axis((4.9784, 21.6408, 0), (0, 0, -1)), revolution_arc=F2_T36_ANGLE, mode=Mode.SUBTRACT)

    # F2_s37 → F2_t38 (revolve, cut)
    with BuildSketch(Plane.XZ.offset(-54.6354)):
        with BuildLine():
            ThreePointArc((1.8034, 1.905), (1.2454384182, 0.5579615818), (-0.1016, 0))
            Line((-0.1016, 0), (1.8034, 0))
            Line((1.8034, 0), (1.8034, 1.905))
        make_face()
    revolve(axis=Axis((4.9784, 54.6354, 0), (0, 0, -1)), revolution_arc=F2_T38_ANGLE, mode=Mode.SUBTRACT)

    # F3
    f3_edges = [f1.edges().sort_by_distance(p)[0] for p in [
        (-29.6926, 38.2016, 9.2202),
        (-29.6926, 38.2016, 0),
    ]]
    chamfer(f3_edges, length=F3_SIZE)


solid = f1.part
